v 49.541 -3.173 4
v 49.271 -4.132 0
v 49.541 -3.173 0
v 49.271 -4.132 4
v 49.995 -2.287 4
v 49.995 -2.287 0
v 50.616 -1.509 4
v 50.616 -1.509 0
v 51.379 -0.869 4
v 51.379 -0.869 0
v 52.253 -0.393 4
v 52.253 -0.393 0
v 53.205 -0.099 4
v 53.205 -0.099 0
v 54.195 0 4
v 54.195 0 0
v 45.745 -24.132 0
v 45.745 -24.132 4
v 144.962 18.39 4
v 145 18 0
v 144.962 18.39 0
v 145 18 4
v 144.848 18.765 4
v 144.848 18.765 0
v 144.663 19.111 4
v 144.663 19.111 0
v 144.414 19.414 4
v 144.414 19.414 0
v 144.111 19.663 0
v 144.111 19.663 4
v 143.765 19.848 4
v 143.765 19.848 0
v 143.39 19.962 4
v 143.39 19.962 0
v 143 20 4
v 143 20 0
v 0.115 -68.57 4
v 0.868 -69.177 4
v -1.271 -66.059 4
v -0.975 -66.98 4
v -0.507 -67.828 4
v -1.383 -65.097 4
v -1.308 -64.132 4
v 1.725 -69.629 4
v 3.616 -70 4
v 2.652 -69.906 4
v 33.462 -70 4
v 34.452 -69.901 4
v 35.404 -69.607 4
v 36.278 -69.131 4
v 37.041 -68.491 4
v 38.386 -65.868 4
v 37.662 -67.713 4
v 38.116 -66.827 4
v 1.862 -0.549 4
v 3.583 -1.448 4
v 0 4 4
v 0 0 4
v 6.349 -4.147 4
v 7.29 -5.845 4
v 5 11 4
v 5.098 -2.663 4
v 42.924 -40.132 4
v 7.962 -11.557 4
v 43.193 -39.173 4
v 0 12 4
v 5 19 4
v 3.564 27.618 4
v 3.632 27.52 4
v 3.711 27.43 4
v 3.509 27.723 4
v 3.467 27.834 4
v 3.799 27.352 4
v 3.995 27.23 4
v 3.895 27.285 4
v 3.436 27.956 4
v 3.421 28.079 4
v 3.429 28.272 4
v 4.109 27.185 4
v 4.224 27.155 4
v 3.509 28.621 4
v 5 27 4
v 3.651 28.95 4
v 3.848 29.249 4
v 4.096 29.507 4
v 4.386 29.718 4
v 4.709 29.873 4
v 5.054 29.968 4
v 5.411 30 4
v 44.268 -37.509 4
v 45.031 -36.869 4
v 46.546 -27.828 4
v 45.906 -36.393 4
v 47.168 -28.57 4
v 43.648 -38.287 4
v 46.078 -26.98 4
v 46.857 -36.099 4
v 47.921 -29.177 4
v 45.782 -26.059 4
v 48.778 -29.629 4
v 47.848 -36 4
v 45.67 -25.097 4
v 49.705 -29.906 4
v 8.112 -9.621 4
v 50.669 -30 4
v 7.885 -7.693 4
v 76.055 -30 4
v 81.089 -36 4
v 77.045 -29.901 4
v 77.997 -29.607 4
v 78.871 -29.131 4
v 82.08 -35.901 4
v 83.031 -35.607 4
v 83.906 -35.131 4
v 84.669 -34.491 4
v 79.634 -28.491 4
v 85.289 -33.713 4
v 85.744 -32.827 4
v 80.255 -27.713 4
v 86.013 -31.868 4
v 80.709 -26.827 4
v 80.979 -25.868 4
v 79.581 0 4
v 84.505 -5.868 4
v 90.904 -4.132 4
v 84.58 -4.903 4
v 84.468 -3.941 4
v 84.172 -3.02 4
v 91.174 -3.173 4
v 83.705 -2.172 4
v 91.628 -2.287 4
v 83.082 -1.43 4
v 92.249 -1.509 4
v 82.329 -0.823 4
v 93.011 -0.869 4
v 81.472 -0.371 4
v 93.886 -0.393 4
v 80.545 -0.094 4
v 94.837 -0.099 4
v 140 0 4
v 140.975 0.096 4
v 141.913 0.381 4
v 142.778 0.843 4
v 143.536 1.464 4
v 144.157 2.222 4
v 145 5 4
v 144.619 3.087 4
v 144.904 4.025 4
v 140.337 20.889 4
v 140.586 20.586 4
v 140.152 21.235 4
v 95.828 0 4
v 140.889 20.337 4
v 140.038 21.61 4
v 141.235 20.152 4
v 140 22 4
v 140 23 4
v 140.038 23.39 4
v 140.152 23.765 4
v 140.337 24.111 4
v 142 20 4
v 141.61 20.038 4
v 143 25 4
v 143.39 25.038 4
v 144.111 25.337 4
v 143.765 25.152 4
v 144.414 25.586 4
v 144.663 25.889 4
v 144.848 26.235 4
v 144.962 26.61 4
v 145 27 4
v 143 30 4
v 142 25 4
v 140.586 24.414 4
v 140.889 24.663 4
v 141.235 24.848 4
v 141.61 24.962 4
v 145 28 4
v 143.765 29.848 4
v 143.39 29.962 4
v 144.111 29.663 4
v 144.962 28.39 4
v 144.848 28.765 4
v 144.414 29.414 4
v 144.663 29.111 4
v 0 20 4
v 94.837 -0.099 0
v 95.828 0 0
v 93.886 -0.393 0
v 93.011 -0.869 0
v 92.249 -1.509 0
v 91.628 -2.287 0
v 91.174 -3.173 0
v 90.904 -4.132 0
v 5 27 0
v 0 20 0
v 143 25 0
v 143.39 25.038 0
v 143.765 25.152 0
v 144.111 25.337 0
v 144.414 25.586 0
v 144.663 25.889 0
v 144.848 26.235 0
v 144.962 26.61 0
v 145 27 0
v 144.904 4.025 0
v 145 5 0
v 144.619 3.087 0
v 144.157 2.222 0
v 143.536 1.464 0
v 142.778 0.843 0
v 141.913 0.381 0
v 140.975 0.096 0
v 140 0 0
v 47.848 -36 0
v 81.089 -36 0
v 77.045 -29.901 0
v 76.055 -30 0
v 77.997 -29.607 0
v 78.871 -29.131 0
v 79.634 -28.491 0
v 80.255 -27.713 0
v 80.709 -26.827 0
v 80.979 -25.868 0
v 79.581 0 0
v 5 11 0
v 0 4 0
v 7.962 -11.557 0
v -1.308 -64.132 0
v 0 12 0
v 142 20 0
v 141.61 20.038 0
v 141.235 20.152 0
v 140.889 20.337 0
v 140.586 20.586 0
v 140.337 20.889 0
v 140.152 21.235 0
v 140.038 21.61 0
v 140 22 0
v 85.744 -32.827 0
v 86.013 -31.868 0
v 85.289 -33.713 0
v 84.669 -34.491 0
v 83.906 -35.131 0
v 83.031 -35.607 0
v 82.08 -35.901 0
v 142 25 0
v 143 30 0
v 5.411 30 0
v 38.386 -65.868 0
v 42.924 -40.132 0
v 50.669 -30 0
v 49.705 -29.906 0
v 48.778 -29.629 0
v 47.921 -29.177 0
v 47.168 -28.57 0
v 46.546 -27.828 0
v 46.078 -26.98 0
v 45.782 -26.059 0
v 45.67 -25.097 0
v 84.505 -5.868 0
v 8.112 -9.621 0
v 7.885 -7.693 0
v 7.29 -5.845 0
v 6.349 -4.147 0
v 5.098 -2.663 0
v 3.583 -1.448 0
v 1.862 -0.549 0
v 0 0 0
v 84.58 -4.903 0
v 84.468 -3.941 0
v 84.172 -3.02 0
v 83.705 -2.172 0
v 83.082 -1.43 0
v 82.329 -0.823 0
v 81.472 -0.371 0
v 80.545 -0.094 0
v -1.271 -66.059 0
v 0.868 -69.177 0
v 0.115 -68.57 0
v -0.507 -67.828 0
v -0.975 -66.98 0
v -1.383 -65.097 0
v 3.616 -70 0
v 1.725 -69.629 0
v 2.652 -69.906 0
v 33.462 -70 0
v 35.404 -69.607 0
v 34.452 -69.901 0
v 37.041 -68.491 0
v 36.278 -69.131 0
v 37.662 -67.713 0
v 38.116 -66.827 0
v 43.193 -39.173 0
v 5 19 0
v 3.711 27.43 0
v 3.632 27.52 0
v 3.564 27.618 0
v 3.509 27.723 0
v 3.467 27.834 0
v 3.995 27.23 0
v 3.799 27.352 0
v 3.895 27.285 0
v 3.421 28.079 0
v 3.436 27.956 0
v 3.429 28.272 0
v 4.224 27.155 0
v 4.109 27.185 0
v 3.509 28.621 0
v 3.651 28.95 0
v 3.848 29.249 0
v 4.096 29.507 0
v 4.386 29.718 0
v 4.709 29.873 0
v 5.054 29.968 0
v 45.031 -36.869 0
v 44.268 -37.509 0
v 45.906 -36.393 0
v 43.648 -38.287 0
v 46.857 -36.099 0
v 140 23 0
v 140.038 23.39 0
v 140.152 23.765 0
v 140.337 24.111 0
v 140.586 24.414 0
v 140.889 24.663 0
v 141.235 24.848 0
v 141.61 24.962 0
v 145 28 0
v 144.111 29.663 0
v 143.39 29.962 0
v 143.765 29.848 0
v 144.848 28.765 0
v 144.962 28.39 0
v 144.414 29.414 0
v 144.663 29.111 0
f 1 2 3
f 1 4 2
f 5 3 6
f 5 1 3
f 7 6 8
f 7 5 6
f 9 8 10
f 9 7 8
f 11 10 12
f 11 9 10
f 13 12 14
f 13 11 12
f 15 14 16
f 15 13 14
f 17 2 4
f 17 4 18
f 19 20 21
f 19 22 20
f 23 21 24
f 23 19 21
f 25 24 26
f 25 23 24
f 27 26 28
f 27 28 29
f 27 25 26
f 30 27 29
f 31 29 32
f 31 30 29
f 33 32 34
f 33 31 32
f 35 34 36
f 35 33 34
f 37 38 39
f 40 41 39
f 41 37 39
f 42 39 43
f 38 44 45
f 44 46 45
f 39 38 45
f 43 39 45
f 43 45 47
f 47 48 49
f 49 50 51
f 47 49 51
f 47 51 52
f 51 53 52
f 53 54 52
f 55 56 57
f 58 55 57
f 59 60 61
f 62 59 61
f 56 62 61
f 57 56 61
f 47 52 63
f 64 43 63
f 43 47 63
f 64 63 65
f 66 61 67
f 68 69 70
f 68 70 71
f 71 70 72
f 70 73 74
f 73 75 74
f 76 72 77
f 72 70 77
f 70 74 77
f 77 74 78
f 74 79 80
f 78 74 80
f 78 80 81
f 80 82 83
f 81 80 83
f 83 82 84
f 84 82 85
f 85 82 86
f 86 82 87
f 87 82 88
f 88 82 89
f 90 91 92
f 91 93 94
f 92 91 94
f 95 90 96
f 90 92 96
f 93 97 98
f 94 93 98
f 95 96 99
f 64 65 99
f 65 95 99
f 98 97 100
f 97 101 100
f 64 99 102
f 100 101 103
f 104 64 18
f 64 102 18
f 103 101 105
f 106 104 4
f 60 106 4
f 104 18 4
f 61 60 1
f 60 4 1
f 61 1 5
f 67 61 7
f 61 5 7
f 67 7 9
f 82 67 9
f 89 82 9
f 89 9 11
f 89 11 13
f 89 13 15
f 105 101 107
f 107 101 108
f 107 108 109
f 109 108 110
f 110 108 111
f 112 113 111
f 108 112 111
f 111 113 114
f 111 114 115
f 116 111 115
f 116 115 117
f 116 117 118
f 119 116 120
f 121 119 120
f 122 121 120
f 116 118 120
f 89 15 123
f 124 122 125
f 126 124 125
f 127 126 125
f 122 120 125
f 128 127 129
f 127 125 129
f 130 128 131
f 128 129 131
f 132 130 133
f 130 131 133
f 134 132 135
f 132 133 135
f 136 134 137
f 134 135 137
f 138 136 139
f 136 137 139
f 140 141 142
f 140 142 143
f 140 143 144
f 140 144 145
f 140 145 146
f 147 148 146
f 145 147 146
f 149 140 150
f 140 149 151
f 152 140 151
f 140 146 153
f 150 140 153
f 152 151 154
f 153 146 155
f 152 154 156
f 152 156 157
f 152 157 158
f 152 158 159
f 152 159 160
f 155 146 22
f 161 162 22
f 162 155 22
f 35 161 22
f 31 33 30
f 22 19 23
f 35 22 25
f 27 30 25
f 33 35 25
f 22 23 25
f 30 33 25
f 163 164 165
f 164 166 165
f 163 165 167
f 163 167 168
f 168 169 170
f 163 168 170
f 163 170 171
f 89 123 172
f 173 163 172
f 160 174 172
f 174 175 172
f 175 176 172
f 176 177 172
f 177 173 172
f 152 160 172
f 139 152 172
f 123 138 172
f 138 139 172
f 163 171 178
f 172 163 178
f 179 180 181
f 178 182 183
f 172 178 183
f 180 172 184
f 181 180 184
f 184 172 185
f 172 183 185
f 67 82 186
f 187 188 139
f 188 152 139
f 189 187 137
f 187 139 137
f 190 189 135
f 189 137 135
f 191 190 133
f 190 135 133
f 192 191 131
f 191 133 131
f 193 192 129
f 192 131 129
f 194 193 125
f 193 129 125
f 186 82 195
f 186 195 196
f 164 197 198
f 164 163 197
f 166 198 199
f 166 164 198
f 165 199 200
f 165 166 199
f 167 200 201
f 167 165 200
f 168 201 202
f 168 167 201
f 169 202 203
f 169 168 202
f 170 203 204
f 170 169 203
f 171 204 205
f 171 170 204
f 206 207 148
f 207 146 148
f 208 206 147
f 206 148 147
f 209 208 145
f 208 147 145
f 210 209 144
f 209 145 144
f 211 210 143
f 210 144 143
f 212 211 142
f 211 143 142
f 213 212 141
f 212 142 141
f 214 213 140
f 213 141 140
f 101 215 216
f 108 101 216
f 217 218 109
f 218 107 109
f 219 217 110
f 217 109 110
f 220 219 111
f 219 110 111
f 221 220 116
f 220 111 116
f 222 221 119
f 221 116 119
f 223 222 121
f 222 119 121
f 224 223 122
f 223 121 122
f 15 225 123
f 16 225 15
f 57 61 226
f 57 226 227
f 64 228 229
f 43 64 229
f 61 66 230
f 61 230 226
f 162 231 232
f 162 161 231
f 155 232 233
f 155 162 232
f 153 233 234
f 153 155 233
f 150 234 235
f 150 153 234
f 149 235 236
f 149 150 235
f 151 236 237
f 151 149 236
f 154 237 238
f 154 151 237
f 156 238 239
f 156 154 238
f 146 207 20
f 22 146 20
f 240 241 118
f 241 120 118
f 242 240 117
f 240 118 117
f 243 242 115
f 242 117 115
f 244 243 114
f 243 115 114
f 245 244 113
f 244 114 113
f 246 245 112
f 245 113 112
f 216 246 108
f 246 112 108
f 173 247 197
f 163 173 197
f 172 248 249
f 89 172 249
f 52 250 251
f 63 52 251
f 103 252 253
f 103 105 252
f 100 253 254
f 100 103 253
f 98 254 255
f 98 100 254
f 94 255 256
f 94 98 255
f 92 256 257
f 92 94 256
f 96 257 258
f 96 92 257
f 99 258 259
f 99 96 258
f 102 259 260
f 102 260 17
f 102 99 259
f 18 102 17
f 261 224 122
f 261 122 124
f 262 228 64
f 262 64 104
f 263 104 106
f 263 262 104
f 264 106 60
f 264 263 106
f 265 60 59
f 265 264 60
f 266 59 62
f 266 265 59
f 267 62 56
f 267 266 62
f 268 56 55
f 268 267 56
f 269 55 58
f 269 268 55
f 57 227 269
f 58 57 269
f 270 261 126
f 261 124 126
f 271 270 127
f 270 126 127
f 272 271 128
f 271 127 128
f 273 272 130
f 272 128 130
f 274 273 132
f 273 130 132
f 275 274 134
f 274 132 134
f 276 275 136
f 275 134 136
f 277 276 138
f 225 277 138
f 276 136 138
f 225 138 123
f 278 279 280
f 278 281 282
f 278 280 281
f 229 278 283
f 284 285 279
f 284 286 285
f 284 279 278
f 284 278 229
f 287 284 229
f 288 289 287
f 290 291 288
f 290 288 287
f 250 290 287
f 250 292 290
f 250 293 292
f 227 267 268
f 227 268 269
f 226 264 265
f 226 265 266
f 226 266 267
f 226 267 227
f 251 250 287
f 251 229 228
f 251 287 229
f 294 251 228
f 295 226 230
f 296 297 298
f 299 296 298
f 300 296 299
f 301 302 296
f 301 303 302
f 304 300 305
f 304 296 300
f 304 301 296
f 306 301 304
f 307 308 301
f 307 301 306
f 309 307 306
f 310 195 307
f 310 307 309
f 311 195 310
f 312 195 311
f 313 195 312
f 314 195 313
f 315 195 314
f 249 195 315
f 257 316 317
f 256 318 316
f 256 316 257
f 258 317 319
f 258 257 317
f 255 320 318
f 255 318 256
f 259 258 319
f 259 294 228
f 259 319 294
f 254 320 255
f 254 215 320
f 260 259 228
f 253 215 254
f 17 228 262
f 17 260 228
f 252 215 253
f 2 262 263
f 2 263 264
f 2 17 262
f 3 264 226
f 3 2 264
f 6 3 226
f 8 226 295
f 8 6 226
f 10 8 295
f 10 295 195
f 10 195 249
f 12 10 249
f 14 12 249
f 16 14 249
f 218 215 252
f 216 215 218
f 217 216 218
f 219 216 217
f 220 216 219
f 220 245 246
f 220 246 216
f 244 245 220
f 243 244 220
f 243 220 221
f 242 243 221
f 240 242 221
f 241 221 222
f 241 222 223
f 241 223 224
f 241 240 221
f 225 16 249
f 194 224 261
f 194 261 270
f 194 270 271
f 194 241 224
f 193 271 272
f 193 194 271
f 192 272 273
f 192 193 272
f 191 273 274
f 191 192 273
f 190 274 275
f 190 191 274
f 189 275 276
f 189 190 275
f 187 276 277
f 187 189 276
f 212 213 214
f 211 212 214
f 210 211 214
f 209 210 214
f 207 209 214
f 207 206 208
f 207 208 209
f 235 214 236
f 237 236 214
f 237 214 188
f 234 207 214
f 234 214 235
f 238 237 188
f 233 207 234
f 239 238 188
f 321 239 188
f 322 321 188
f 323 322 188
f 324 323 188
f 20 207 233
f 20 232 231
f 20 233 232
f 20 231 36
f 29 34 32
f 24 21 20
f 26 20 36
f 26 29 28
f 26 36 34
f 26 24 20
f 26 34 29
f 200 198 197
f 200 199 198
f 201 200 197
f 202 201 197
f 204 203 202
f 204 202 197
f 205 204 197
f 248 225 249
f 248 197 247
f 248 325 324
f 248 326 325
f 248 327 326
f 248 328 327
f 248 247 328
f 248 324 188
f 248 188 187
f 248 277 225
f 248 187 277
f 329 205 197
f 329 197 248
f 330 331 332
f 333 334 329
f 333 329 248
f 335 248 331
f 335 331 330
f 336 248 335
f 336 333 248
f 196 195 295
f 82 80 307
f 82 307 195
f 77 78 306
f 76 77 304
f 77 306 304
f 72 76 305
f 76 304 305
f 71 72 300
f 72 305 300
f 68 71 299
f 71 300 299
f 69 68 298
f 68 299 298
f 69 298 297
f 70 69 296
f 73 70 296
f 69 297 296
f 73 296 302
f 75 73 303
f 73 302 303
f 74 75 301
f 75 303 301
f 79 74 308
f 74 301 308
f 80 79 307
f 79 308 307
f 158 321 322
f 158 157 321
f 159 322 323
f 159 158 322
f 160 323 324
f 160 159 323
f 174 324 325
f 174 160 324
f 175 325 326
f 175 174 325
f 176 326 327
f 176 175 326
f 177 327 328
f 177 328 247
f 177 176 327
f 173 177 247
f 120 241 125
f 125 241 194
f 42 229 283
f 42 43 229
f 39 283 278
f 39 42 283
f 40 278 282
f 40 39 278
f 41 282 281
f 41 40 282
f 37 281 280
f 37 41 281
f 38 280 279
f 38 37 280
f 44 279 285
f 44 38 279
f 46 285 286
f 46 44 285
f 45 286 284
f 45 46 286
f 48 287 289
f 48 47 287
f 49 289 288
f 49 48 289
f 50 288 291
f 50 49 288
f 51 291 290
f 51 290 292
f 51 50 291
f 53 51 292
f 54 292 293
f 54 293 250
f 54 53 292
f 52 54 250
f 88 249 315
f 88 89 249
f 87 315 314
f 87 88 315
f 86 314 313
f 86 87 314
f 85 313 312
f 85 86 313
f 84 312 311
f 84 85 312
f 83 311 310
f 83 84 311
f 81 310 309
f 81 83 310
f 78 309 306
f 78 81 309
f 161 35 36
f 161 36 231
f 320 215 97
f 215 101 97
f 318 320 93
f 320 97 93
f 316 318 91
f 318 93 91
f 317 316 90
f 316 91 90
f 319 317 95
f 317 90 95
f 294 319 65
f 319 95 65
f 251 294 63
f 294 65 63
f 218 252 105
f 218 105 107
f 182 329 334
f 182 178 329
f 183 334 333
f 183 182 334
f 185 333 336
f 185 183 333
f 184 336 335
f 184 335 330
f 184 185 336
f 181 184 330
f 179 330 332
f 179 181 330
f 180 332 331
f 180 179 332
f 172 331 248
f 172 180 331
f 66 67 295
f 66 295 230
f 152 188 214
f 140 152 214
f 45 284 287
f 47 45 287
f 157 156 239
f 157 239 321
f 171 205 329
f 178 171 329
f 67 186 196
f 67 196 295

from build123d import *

# Parameters (mm, degrees)
BOSS_EXTRUDE1_DEPTH = 4
FILLET1_R           = 10
FILLET2_R           = 5
CUT_EXTRUDE1_DEPTH  = 4
LPATTERN1_COUNT     = 3
LPATTERN1_PITCH     = 8
FILLET3_R           = 2
FILLET4_R           = 2
CUT_EXTRUDE2_DEPTH  = 10
FILLET5_R           = 2
FILLET6_R           = 1


with BuildPart() as part:
    # Sketch1 → Boss-Extrude1 (new body)
    with BuildSketch(Plane.XY):
        Polygon((10, 0), (-2.34288865, -70), (37.65711135, -70), (43.652228694, -36), (85.284719782, -36), (91.632491087, 0), (145, 0), (145, 20), (140, 20), (140, 25), (145, 25), (145, 30), (0, 30), (0, 0), align=None)
        Polygon((44.710190579, -30), (80.250121995, -30), (85.539931416, 0), (50, 0), align=None, mode=Mode.SUBTRACT)
    extrude(amount=BOSS_EXTRUDE1_DEPTH)

    # Fillet1
    # the kernel refuses this fillet: 10 mm, written as the material it adds along each edge
    with BuildSketch(Plane(origin=(10, 0, 0), x_dir=(-0.17364817766693433, -0.9848077530122074, 0), z_dir=(0, 0, 1))) as fillet1_piece_1:
        with BuildLine():
            CenterArc((11.735327688, -10), FILLET1_R, 90, 89.129514879)
            Line((1.736481777, -9.84807753), (1.536504858, -9.845039081))
            ThreePointArc((1.536504858, -9.845039081), (0.671279338, -4.958768401), (-0.196961551, -0.034729636))
            Line((-0.196961551, -0.034729636), (0, 0.2))
            Line((0, 0.2), (11.735327688, 0.2))
            Line((11.735327688, 0.2), (11.735327688, 0))
        make_face()
    extrude(amount=4)

    # Fillet2
    fillet2_edges = [part.edges().sort_by_distance(p)[0] for p in [
        (145, 0, 2),
        (91.632491087, 0, 2),
        (85.284719782, -36, 2),
        (43.652228694, -36, 2),
        (37.65711135, -70, 2),
        (-2.34288865, -70, 2),
        (85.539931416, 0, 2),
        (50, 0, 2),
        (44.710190579, -30, 2),
        (80.250121995, -30, 2),
    ]]
    fillet(fillet2_edges, radius=FILLET2_R)

    # Sketch2 → Cut-Extrude1 (cut)
    with BuildSketch(Plane.XY.offset(4)):
        Polygon((0, 20), (0, 28), (5, 27), align=None)
    cut_extrude1 = extrude(amount=-CUT_EXTRUDE1_DEPTH, mode=Mode.SUBTRACT)

    # LPattern1: Cut-Extrude1 ×3
    with Locations(*[(0, -i * LPATTERN1_PITCH, 0) for i in range(1, LPATTERN1_COUNT)]):
        add(cut_extrude1, mode=Mode.SUBTRACT)

    # Fillet3
    fillet3_edges = [part.edges().sort_by_distance(p)[0] for p in [
        (145, 25, 2),
        (140, 25, 2),
        (140, 20, 2),
        (145, 20, 2),
    ]]
    fillet(fillet3_edges, radius=FILLET3_R)

    # Fillet4
    fillet4_edges = [part.edges().sort_by_distance(p)[0] for p in [
        (145, 30, 2),
    ]]
    fillet(fillet4_edges, radius=FILLET4_R)

    # Sketch3 → Cut-Extrude2 (cut)
    with BuildSketch(Plane.XY.offset(4)):
        Polygon((3.410578707, 27.317884259), (3.410578707, 32.702988903), (-2.245047392, 32.702988903), (-2.245047392, 26.199863932), align=None)
    extrude(amount=-CUT_EXTRUDE2_DEPTH, mode=Mode.SUBTRACT)

    # Fillet5
    fillet5_edges = [part.edges().sort_by_distance(p)[0] for p in [
        (3.410578707, 30, 2),
    ]]
    fillet(fillet5_edges, radius=FILLET5_R)

    # Fillet6
    fillet6_edges = [part.edges().sort_by_distance(p)[0] for p in [
        (3.410578707, 27.317884259, 2),
    ]]
    fillet(fillet6_edges, radius=FILLET6_R)


solid = part.part
